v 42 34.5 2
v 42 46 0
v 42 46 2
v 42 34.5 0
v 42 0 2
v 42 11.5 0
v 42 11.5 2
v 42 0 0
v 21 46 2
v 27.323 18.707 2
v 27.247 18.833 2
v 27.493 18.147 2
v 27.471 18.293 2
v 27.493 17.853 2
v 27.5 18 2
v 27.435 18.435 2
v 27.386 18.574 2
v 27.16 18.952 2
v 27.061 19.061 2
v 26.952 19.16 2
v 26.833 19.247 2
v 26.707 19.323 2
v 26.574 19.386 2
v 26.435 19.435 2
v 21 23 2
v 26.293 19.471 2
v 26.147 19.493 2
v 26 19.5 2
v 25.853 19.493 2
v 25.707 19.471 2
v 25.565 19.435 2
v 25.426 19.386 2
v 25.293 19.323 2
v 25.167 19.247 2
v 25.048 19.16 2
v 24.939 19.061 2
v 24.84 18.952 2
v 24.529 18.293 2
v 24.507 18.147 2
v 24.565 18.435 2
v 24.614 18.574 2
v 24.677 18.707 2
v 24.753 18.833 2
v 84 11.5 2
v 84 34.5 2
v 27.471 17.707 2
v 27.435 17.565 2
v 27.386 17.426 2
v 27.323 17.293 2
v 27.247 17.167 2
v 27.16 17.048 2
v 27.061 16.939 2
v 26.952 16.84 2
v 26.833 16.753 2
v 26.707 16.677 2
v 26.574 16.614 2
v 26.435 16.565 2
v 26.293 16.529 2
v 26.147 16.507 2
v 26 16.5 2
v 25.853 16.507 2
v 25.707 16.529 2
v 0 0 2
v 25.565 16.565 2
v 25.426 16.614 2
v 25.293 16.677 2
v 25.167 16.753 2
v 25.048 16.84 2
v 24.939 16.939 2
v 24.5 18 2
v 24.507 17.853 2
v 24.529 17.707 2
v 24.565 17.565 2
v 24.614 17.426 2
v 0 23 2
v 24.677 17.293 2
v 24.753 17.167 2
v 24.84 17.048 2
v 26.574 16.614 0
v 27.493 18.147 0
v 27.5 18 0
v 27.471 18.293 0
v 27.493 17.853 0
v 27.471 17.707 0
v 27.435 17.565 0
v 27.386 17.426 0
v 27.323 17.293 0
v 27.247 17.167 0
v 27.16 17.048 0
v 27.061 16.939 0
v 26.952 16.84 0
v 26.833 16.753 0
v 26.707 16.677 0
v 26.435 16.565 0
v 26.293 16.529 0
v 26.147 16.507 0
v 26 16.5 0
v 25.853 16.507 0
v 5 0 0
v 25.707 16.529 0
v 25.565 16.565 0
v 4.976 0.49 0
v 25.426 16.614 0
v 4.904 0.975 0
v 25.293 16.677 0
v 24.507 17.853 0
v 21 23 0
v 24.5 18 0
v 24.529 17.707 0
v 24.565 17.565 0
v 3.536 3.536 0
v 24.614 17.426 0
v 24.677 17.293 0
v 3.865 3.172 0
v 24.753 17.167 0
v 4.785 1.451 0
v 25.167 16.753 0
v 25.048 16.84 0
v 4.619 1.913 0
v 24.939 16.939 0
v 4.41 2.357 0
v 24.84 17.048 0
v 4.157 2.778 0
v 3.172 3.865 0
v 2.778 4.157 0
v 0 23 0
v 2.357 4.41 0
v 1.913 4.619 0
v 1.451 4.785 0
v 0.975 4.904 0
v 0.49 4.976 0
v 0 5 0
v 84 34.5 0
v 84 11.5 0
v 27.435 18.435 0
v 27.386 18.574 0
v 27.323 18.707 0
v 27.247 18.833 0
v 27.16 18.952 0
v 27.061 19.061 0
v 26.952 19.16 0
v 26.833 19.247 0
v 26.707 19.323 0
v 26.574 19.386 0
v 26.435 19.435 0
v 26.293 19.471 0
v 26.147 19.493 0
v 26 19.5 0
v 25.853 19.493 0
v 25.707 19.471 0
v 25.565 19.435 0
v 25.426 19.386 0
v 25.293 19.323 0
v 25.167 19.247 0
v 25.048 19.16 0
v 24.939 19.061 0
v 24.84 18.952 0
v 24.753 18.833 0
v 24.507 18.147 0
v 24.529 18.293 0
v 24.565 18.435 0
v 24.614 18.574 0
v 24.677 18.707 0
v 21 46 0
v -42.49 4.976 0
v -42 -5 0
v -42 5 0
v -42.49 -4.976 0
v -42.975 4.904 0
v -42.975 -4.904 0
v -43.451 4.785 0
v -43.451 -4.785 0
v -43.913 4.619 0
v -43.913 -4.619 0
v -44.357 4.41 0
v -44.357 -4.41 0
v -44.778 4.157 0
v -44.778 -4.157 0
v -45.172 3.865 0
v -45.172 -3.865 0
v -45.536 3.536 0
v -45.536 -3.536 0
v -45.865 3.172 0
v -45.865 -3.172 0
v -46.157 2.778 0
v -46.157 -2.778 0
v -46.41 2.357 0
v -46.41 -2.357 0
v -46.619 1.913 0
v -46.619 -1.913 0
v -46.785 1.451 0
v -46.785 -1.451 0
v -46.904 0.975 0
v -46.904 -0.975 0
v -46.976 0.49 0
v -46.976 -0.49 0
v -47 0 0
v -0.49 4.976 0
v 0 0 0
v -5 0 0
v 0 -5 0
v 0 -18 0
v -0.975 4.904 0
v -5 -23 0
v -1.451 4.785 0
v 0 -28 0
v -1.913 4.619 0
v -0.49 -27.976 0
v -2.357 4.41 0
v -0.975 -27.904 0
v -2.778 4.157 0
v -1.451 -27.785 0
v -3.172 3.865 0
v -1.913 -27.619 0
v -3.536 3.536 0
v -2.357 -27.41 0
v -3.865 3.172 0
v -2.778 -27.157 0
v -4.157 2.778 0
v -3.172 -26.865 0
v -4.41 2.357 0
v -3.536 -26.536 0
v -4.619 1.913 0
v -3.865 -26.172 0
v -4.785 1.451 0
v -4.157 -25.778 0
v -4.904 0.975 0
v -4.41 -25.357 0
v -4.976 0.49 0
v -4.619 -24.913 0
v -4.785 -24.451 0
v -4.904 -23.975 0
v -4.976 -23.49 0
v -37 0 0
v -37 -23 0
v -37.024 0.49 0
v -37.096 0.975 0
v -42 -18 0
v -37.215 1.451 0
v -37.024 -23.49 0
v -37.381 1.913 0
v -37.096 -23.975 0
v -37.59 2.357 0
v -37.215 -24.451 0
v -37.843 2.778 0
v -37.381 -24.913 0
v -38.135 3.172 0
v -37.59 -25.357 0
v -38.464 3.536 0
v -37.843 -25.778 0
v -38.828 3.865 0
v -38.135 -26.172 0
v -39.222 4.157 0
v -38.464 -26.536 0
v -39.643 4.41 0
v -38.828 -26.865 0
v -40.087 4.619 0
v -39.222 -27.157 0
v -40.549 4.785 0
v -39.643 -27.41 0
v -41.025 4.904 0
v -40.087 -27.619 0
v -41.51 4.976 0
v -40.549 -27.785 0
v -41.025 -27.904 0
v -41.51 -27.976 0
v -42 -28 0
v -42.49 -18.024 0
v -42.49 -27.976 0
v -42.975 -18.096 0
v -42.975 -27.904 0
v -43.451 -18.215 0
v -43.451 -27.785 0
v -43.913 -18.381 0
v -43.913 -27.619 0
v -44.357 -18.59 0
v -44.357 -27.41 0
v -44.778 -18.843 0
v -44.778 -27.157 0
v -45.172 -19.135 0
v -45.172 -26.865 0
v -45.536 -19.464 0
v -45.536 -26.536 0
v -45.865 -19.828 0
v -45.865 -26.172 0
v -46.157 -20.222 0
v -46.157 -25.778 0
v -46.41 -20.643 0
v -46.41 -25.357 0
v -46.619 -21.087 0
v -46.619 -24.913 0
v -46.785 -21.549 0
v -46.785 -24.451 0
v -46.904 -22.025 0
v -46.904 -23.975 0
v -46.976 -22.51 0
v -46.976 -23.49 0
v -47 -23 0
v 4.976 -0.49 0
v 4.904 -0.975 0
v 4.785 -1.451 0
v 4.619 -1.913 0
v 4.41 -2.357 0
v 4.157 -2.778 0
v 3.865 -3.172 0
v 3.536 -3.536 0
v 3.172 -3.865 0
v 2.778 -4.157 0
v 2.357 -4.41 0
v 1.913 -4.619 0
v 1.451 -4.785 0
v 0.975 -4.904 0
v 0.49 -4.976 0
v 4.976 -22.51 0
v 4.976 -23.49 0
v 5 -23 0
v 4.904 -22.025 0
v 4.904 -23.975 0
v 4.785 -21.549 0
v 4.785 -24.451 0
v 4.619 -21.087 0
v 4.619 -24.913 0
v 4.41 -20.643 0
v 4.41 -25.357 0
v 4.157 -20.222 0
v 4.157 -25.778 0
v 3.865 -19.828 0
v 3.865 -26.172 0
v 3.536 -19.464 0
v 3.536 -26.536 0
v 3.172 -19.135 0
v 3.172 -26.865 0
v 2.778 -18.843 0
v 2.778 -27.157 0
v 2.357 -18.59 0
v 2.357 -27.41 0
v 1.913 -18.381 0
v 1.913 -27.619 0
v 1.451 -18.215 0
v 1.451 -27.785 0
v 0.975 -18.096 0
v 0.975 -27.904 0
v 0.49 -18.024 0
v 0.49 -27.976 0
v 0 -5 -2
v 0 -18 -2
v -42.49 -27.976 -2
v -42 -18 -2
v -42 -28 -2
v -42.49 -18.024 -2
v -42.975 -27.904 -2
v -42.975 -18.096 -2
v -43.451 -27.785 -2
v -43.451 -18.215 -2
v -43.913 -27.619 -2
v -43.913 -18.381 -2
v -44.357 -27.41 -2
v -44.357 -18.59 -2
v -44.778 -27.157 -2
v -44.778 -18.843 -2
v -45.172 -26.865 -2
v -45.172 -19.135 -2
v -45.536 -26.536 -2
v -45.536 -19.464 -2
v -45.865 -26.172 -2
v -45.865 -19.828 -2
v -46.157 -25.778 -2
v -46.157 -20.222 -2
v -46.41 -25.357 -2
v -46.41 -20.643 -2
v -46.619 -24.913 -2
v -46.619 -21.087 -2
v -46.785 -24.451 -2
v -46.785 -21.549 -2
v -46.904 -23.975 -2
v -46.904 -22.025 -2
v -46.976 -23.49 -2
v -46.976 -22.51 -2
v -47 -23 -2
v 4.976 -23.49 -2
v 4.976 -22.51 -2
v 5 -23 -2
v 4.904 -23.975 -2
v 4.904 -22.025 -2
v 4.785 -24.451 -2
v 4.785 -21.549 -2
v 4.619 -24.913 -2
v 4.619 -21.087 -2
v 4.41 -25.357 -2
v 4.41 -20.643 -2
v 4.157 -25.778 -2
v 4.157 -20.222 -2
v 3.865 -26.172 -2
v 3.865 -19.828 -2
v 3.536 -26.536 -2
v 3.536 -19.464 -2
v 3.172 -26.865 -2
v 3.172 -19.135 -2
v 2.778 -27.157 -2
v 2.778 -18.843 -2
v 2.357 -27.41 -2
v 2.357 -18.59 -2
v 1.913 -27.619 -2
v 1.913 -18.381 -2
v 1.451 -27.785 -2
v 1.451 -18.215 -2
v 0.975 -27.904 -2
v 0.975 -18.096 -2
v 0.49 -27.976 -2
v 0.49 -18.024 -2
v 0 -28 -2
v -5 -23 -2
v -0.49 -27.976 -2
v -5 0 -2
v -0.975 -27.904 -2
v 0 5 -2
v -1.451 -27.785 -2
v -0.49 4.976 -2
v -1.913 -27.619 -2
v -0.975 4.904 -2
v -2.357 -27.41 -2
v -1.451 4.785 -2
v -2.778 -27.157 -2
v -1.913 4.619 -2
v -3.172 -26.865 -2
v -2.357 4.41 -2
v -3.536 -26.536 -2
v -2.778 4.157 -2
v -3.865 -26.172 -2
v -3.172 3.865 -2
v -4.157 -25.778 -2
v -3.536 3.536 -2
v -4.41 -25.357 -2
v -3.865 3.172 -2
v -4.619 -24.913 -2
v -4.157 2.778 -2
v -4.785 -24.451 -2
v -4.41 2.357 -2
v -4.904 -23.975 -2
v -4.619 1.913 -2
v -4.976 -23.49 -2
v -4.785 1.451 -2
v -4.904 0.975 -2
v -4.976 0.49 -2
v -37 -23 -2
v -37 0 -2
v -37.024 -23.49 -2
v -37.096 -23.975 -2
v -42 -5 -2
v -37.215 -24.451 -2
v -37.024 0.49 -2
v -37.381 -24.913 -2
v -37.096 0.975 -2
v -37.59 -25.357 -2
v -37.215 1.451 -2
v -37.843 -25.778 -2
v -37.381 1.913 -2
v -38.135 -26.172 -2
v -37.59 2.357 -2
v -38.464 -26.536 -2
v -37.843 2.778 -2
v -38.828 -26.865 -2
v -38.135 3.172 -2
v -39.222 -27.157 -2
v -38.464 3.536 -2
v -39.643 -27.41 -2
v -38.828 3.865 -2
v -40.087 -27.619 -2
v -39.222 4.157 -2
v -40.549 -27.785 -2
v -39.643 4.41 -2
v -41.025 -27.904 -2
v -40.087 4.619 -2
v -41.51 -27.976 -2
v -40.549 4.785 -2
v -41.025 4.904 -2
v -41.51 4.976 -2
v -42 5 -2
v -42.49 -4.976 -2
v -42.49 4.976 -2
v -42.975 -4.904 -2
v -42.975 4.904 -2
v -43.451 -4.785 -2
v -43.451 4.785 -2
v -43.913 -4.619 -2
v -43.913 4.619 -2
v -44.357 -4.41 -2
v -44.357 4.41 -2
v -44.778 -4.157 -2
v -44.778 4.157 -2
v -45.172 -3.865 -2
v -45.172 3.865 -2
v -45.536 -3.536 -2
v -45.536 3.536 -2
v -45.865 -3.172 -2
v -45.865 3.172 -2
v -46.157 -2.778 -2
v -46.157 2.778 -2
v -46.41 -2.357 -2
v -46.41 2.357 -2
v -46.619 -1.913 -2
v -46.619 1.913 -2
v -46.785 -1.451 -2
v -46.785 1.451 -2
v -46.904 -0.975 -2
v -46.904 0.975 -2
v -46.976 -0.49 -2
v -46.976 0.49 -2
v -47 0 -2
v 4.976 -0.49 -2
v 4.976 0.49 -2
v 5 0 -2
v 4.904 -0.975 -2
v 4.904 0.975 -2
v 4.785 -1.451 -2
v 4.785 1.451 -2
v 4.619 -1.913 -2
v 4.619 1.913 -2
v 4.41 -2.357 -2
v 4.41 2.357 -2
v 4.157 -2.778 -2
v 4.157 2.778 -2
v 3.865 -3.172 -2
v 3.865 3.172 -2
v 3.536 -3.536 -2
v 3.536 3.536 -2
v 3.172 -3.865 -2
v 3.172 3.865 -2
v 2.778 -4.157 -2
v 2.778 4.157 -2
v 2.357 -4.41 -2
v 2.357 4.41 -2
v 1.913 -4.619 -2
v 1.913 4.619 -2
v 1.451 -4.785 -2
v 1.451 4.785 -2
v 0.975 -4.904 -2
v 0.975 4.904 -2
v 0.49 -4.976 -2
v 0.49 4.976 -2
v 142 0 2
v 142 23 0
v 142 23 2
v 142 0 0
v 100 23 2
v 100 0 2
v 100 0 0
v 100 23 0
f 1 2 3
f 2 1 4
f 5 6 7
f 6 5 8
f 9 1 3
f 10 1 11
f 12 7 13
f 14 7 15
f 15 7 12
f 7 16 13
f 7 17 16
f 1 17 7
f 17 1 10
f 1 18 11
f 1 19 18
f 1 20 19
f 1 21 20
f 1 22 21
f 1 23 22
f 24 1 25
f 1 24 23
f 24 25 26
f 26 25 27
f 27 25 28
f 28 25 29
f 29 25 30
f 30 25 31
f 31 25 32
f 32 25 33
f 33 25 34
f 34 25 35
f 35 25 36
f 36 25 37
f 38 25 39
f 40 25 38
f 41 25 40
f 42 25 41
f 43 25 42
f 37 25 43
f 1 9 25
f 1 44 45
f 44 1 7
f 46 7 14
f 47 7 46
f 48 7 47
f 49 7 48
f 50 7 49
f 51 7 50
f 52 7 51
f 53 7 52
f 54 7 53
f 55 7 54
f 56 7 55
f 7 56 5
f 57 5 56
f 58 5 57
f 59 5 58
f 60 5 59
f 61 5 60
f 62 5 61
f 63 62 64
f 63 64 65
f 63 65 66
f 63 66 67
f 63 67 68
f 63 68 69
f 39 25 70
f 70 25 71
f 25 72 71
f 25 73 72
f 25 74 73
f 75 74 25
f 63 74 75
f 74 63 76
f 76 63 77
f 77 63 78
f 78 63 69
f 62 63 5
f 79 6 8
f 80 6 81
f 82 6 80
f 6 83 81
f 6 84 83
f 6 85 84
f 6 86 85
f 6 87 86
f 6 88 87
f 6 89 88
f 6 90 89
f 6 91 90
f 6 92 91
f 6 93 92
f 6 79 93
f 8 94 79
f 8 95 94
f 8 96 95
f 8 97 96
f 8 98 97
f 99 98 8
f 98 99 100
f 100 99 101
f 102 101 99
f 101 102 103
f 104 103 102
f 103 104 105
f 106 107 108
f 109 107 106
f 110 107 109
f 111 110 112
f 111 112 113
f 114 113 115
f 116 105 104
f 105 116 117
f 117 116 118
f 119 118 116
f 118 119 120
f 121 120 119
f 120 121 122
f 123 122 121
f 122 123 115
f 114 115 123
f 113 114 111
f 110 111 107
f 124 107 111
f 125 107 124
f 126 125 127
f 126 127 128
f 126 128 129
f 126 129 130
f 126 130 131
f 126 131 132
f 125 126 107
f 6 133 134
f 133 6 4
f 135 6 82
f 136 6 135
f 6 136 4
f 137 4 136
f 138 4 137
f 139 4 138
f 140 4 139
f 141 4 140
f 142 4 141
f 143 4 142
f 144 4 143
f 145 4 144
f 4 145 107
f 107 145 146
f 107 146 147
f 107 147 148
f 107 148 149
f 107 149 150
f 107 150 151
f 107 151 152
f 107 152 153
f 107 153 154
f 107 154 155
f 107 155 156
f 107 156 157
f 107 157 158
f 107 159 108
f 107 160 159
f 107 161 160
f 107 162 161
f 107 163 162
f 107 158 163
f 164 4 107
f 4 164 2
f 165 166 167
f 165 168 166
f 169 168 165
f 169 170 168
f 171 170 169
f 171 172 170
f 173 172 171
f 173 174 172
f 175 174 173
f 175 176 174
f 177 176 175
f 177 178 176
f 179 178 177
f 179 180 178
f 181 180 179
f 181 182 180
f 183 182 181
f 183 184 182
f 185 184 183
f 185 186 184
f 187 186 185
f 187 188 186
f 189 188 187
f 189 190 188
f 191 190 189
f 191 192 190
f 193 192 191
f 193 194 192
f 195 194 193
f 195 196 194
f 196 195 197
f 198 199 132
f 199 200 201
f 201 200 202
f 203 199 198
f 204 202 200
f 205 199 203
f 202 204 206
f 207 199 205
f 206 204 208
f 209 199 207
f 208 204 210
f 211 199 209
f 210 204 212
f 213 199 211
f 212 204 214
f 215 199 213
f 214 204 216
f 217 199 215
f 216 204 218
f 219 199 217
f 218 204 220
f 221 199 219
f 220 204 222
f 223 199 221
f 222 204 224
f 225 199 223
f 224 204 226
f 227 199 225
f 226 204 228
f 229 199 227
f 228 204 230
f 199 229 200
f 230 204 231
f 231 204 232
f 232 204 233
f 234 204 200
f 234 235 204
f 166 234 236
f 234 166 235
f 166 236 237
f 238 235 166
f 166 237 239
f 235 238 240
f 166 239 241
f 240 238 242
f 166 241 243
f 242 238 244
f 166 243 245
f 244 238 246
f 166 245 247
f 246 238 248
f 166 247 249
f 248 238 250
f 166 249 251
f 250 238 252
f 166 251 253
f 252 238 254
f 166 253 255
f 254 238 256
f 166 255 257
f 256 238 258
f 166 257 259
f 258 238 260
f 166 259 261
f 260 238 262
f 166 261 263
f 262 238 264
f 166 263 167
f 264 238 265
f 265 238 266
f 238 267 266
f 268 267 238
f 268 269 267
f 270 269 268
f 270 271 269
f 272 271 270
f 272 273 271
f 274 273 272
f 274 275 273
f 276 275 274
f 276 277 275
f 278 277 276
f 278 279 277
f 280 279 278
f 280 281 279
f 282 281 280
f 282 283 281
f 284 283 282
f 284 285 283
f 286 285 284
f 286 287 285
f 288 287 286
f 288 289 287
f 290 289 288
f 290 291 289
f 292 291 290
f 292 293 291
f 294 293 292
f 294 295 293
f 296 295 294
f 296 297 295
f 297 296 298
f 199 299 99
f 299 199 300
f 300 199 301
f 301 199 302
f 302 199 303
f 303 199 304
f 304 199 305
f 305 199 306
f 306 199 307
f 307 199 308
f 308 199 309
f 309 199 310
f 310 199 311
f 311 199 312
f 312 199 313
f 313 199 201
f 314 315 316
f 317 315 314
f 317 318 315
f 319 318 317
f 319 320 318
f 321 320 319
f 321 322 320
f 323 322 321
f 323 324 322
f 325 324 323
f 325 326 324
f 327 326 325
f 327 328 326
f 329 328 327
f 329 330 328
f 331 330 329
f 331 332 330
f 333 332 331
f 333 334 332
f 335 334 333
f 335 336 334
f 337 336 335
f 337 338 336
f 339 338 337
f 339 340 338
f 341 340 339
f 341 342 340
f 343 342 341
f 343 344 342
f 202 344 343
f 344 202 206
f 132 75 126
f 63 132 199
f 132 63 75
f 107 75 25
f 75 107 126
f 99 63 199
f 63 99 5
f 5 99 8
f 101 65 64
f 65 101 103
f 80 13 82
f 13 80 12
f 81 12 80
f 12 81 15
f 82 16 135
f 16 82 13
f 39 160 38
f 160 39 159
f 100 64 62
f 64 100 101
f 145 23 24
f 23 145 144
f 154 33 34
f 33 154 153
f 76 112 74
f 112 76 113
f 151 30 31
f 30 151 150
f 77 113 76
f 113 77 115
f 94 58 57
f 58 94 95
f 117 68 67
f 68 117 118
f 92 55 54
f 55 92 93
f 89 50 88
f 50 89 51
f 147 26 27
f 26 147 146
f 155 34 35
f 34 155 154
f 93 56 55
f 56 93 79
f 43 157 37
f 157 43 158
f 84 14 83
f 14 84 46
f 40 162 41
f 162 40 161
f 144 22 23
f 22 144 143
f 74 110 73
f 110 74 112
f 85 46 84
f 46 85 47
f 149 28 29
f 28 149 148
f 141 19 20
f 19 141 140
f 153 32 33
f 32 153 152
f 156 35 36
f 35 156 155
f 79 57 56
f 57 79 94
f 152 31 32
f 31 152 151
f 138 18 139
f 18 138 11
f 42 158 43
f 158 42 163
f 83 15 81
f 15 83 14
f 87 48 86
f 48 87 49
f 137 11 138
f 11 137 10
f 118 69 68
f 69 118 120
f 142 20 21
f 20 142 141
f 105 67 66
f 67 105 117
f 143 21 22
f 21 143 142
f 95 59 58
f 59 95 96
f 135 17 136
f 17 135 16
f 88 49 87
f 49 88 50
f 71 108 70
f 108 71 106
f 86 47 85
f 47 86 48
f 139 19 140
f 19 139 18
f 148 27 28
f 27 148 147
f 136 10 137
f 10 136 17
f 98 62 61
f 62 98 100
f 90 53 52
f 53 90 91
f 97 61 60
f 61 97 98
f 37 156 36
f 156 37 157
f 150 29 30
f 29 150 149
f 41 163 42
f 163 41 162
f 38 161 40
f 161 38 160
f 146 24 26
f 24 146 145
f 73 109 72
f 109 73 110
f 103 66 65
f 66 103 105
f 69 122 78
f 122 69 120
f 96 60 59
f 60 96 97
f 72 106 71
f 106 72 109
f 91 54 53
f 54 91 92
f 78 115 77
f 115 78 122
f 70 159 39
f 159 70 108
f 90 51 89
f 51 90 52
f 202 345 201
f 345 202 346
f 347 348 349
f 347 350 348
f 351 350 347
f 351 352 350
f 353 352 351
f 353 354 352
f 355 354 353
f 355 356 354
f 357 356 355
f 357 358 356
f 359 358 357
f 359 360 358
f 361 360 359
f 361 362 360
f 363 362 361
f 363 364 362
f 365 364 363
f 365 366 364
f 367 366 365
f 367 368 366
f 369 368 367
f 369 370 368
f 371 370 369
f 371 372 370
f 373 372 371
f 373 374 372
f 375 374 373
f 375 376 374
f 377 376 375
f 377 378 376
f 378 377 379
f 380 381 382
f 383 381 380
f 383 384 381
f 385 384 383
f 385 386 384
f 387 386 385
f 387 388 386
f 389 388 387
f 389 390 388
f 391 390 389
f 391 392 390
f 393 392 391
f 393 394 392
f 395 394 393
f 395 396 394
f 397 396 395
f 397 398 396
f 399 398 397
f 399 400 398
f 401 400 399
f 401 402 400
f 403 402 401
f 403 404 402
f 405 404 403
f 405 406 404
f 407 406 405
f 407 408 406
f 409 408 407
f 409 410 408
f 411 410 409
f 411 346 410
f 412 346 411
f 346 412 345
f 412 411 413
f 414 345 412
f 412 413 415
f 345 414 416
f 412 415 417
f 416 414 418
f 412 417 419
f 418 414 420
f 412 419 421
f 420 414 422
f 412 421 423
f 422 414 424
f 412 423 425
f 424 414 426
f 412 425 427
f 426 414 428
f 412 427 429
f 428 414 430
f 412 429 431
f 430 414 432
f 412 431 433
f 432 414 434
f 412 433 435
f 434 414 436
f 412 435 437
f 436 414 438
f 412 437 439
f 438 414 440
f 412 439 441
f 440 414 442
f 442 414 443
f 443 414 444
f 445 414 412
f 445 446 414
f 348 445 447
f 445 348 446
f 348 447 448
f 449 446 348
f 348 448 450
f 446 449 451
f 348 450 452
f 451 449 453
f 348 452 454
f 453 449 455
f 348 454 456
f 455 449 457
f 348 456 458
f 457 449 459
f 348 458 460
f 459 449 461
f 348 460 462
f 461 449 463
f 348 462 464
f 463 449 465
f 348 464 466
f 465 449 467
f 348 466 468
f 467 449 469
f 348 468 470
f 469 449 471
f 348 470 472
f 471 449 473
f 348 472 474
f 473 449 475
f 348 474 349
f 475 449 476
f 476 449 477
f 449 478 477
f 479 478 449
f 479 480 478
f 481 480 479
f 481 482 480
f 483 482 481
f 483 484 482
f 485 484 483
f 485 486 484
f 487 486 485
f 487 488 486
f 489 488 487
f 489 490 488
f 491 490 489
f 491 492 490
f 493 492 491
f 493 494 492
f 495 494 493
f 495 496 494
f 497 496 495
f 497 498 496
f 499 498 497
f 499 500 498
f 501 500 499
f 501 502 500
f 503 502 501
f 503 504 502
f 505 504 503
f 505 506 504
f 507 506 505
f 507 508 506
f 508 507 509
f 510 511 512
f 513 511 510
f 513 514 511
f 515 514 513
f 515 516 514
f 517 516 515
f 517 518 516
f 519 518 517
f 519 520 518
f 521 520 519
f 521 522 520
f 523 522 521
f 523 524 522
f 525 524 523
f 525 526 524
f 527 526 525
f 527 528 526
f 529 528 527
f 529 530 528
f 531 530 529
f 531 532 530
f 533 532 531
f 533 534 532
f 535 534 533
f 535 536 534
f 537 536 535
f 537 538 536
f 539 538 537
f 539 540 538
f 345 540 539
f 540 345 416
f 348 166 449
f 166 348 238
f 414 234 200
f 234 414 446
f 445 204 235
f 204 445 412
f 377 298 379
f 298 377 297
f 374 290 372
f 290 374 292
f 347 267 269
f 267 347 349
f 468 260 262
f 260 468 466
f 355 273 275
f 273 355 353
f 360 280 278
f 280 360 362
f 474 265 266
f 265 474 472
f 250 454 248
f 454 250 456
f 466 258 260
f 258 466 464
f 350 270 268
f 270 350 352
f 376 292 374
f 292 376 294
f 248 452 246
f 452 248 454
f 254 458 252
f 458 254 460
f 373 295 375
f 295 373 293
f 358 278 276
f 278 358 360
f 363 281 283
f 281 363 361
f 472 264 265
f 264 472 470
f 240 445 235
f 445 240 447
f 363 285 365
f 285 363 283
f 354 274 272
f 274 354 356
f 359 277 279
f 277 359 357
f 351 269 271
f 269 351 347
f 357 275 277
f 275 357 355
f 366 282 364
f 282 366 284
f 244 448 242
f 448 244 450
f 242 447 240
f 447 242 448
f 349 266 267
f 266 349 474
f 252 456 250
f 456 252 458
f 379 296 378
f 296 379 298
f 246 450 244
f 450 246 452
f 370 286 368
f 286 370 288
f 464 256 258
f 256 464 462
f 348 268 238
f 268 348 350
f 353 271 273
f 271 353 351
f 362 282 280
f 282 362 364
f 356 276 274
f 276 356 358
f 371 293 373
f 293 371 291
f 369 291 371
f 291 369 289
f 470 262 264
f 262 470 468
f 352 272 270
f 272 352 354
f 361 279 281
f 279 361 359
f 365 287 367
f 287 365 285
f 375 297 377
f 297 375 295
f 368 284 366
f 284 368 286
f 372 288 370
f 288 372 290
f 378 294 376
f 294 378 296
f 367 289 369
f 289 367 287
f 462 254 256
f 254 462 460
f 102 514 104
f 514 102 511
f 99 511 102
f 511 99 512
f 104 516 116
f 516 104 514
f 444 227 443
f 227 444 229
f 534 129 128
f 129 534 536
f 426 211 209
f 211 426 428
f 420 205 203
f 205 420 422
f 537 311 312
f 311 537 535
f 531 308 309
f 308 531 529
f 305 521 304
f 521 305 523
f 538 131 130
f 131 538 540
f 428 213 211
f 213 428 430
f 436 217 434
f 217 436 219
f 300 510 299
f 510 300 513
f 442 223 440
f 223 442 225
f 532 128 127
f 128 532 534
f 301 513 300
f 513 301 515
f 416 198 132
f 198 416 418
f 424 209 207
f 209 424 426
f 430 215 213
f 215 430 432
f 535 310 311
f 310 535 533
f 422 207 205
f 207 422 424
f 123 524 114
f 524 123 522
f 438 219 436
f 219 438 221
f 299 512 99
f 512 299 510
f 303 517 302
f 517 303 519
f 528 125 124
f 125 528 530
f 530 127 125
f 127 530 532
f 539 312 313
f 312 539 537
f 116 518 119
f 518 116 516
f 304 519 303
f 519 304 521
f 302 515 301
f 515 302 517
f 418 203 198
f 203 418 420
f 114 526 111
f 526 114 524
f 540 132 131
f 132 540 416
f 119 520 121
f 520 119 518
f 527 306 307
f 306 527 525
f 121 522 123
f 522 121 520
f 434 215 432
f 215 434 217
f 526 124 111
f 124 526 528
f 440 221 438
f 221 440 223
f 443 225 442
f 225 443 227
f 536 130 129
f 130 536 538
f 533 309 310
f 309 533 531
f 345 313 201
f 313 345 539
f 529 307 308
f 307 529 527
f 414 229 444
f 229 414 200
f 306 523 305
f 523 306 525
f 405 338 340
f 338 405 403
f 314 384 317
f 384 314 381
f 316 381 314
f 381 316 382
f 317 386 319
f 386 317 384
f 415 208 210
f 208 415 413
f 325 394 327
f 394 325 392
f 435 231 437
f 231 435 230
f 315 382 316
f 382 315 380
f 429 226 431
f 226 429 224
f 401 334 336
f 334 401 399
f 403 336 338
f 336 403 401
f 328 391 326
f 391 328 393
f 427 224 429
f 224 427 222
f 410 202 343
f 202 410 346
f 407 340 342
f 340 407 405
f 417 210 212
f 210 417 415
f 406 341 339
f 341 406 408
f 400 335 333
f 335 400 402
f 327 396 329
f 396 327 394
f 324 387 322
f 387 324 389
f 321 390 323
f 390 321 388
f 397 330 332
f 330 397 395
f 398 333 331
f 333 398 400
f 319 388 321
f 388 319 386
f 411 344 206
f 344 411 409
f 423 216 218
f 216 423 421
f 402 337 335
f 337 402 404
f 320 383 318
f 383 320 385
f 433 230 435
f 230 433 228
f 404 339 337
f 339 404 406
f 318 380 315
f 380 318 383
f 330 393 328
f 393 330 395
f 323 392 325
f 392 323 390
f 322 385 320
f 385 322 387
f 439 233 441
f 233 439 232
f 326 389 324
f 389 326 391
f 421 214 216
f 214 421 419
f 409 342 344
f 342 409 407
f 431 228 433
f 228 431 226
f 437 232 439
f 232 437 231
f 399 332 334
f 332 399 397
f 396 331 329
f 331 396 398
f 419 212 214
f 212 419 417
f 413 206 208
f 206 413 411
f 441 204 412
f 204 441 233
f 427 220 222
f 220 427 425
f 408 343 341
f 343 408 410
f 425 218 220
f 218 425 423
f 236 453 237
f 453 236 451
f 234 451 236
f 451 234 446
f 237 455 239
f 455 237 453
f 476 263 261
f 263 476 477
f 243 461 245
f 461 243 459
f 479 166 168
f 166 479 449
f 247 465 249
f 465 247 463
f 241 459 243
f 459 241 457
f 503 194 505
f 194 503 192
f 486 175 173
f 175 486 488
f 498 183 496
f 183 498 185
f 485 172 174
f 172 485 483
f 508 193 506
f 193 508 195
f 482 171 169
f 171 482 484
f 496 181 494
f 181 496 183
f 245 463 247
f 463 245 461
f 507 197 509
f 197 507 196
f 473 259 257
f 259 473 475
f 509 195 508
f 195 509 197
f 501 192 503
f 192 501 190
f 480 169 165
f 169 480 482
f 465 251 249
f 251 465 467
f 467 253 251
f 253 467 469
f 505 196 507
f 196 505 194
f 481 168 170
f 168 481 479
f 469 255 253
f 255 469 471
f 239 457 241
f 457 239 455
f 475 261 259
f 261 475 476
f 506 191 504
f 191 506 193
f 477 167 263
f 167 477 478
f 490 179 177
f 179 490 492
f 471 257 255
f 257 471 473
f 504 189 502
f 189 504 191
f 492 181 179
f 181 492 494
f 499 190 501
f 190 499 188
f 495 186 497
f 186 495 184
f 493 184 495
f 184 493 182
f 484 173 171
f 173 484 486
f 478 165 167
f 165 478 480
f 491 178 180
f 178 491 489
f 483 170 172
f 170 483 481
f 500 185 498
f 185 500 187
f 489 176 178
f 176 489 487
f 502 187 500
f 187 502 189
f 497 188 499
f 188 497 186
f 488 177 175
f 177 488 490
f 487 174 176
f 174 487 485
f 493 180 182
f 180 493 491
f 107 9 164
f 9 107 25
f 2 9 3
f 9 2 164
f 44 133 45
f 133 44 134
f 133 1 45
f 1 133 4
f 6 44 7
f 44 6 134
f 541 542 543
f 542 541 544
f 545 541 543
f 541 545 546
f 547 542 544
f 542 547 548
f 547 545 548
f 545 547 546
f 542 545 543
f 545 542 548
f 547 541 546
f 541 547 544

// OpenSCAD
module CubeMoveOrigin(){
  union(){
    difference(){
      translate([0, 0, 0])color("HotPink")cube([42, 23, 2.0]);
      translate([0, 0, -0.1])translate([5, -5, 0])translate([21, 23, 0])color("HotPink")cylinder(d=3,h=2.2,$fn=64);
    }

    translate([0, 0, 0])translate([21, 23, 0])color("blue")cube([21.0, 23, 2.0]);
    translate([0, 0, 0])translate([42, 11.5, 0])color("purple")cube([42, 23, 2.0]);
    translate([0, 0, 0])translate([100, 0, 0])color("MediumVioletRed")cube([42, 23, 2.0]);
    translate([0, 0, -2])translate([-21, -11.5, 0])union(){
          translate([-21, -11.5, 0])color("DarkOrchid")cube([42, 23, 2.0]);
          translate([-21, -11.5, 0])color("DarkRed")cylinder(d=10,h=2,$fn=64);
          translate([21, 11.5, 0])color("Red")cylinder(d=10,h=2,$fn=64);
          translate([21, -11.5, 0])color("hotpink")cylinder(d=10,h=2,$fn=64);
          translate([-21, 11.5, 0])color("mediumvioletred")cylinder(d=10,h=2,$fn=64);
        }

  }
}
$fn=64;
CubeMoveOrigin();
